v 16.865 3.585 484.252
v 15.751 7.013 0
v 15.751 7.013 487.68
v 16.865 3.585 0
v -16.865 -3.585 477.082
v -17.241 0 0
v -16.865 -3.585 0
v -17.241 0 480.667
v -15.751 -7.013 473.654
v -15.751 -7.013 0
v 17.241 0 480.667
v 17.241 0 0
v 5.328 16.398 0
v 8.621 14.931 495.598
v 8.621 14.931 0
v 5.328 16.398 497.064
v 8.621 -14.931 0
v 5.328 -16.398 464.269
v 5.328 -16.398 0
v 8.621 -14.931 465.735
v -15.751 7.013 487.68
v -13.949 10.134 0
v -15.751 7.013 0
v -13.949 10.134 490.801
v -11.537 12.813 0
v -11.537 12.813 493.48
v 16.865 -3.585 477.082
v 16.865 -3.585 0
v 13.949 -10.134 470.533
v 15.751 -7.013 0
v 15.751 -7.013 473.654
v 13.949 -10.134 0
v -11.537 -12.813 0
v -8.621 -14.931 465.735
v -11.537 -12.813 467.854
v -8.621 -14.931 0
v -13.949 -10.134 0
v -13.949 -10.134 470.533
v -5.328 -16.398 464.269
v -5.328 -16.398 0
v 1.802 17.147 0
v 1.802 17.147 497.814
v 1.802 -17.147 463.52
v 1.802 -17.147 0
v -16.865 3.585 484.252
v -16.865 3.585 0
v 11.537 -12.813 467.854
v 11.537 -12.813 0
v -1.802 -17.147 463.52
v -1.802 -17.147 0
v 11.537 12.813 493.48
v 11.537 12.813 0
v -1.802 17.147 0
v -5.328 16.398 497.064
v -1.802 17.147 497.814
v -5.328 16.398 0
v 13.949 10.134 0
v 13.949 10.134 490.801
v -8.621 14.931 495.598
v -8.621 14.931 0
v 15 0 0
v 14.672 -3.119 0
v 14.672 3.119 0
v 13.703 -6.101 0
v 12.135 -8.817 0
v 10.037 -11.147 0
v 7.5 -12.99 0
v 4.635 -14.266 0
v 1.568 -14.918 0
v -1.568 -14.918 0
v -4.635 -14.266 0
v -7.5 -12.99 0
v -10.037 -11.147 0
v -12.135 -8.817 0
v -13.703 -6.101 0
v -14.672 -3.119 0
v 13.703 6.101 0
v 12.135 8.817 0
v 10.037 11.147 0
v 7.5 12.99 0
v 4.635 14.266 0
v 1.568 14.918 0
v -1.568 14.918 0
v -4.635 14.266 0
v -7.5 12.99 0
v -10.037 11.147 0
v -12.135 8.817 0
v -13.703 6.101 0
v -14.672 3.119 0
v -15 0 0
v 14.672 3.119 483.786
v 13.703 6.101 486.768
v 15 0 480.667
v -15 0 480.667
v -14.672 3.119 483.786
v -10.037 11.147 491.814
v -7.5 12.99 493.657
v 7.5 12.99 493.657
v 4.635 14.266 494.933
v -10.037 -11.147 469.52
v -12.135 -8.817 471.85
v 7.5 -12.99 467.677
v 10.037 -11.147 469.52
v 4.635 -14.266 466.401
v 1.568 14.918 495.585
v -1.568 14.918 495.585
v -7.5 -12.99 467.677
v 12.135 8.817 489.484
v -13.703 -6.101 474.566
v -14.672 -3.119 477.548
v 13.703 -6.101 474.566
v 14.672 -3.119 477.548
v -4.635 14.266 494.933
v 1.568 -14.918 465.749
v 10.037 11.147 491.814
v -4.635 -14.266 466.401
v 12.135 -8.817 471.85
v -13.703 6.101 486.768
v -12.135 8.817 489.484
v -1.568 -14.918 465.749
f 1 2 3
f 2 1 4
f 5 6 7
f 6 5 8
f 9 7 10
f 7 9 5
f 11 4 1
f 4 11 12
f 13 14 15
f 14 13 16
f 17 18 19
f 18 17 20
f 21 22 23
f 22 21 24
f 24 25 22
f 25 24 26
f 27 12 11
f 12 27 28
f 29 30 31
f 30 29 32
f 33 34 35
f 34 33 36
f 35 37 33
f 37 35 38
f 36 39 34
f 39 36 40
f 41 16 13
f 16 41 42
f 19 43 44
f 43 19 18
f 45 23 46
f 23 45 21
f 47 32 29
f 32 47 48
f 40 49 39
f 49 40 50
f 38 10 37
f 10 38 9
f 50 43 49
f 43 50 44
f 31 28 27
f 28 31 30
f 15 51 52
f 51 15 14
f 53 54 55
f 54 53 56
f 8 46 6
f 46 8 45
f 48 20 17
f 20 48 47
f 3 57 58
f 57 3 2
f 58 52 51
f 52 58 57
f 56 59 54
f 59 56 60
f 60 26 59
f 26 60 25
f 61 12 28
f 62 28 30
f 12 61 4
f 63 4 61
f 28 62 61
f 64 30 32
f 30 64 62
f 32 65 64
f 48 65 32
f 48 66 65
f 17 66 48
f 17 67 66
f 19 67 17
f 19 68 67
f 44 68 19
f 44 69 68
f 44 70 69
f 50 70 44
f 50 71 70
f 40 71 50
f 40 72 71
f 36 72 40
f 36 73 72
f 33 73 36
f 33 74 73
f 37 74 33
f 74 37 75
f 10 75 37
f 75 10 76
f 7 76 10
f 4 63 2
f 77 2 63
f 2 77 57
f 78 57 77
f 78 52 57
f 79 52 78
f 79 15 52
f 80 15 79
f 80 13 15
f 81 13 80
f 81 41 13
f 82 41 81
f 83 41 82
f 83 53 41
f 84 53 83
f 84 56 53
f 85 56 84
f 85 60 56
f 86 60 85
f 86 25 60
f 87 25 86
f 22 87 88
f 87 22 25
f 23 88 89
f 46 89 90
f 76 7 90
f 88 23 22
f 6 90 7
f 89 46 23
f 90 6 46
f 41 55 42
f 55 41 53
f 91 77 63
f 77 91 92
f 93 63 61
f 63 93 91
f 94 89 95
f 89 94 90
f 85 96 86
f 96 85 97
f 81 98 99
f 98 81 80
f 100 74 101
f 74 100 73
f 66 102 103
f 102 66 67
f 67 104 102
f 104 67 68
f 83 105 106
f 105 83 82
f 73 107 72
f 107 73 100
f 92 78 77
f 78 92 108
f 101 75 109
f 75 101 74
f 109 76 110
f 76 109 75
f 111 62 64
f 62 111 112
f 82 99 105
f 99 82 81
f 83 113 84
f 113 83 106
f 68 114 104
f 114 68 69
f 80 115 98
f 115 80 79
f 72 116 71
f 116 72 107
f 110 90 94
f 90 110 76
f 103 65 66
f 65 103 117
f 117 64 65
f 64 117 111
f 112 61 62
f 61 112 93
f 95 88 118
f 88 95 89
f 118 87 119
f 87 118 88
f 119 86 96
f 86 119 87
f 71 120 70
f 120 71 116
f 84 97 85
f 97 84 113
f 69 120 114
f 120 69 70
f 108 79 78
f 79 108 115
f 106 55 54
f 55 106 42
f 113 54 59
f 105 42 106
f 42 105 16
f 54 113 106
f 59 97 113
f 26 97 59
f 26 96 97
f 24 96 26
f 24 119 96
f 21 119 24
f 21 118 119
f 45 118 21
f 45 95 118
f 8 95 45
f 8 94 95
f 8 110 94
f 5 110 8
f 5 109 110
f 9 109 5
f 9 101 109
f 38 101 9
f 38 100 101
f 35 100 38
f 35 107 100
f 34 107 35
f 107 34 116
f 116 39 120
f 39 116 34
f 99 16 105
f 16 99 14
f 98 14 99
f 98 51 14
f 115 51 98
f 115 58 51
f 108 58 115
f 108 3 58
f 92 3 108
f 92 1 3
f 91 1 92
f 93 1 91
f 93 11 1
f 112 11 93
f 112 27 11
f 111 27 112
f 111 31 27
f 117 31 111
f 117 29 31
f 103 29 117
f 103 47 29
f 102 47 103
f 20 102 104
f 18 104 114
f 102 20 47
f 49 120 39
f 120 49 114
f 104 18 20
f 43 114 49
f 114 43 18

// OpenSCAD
//The 3D Straw of Boba mike tea
//程式宅的珍奶吸管自己做 By HsinKen
bobaWidth = 30; //珍珠直徑
strawHeight = 500; //吸管高度
cutAngle = 45; //切口角度 0~80

module straw(radius,height,angle) {
    shellR = (0.5*radius)/0.87;
    difference() {
        linear_extrude(strawHeight) 
            circle(shellR);
        linear_extrude(strawHeight) 
            circle(0.5*radius);
    
    cubeSize = shellR*2;
        
    translate ([0,0,height+cubeSize*0.5-sin(angle)*shellR]) {
        rotate([angle,0,0]){
        cube([cubeSize,(shellR*sin(angle))*cubeSize,cubeSize],center=true);
        }
    }
    
    }
}

straw(bobaWidth,strawHeight,cutAngle);
